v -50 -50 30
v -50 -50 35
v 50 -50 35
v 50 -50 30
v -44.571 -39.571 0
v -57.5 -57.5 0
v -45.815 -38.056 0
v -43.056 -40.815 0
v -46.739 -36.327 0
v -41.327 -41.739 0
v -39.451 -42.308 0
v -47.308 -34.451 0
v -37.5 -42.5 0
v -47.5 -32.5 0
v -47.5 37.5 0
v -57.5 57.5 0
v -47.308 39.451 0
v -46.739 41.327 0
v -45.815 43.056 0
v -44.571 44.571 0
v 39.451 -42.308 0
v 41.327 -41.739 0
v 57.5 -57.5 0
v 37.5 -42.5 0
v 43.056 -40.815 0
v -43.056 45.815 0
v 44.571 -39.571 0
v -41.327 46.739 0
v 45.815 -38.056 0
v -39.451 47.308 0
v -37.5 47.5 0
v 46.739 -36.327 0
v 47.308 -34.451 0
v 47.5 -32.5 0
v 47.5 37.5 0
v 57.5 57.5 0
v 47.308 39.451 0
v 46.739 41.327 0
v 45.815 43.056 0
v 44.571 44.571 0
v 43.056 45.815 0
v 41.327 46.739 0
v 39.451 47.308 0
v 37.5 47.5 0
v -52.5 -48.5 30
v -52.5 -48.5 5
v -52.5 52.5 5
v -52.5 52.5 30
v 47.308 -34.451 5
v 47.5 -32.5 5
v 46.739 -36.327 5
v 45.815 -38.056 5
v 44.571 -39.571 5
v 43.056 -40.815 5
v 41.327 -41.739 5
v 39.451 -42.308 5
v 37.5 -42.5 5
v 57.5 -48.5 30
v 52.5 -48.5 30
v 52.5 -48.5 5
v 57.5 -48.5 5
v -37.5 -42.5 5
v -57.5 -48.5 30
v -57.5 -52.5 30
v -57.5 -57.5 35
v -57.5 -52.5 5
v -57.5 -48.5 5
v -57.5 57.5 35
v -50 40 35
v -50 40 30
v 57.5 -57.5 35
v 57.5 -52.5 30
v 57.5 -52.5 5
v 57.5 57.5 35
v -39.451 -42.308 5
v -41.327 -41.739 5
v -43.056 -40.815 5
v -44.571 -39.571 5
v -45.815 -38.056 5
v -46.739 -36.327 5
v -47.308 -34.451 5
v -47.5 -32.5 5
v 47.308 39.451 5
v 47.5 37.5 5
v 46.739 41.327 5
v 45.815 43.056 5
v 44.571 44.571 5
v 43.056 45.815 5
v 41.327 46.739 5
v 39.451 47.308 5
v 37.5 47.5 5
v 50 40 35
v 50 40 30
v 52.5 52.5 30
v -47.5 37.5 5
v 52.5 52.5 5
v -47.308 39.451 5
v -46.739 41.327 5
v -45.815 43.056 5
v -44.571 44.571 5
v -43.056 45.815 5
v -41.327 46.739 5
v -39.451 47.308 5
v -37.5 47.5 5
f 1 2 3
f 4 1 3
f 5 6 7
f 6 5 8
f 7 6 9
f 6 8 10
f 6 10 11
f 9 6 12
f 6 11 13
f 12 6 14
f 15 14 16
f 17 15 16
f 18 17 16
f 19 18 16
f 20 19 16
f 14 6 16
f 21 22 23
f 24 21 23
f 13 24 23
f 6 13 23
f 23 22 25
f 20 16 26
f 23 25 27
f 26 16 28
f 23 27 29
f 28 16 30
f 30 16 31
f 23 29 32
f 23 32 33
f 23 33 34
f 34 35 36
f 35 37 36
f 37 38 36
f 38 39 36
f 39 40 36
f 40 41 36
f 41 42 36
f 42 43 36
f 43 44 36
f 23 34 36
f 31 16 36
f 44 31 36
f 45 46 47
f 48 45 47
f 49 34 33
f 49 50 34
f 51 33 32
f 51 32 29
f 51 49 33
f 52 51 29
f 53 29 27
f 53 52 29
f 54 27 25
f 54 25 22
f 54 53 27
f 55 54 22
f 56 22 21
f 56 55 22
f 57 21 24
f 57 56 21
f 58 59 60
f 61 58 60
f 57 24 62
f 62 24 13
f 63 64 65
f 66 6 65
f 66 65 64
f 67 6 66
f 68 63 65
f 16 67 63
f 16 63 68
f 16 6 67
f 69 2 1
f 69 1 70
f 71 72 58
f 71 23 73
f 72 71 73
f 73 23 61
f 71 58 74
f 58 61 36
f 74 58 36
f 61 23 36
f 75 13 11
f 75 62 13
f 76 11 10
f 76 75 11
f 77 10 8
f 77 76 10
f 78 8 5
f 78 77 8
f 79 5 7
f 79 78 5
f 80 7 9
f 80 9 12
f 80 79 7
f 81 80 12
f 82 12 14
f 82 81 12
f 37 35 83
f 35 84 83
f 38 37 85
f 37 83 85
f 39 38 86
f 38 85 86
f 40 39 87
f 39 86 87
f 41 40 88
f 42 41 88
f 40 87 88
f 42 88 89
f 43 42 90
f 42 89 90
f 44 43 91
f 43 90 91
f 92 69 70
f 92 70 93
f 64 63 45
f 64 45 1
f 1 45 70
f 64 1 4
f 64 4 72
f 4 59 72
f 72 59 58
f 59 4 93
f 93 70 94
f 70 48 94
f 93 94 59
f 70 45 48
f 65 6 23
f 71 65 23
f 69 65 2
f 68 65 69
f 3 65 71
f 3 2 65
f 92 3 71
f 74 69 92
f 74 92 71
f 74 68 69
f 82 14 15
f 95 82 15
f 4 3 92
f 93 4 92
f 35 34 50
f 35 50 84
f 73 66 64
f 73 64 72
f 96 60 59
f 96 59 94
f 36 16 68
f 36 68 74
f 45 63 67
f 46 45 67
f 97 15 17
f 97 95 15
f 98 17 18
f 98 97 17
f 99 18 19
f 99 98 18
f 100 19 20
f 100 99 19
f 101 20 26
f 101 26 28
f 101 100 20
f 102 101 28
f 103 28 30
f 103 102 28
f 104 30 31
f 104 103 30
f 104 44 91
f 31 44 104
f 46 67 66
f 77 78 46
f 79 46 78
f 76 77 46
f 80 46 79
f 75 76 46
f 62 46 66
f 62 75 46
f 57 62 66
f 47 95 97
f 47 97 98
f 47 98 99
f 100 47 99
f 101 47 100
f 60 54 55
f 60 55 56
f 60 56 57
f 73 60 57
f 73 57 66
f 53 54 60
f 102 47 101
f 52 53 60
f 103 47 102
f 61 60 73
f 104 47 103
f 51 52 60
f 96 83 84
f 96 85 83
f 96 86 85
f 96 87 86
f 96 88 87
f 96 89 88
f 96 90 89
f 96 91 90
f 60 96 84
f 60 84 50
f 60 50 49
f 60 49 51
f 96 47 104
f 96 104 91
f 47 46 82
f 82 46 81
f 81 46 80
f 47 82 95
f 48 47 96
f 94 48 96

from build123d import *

# Parameters (mm, degrees)
SKETCH1_W               = 115
SKETCH1_H               = 115
BOSS_EXTRUDE1_DEPTH     = 35
SHELL2_T                = 5
SKETCH4_W               = 100
SKETCH4_H               = 90
CUT_EXTRUDE1_DEPTH      = 30
SKETCH5_W               = 95
SKETCH5_H               = 90
CUT_EXTRUDE2_DEPTH      = 30
FILLET1_R               = 10
CUT_EXTRUDE3_DEPTH      = 129.962203765
CUT_EXTRUDE3_DEPTH_BACK = 129.962203765
SKETCH9_W               = 25
SKETCH9_H               = 4


with BuildPart() as part:
    # Sketch1 → Boss-Extrude1 (new body)
    with BuildSketch(Plane.XY):
        Rectangle(SKETCH1_W, SKETCH1_H)
    extrude(amount=BOSS_EXTRUDE1_DEPTH)

    # Shell2 (no face opened: a closed hollow body)
    add(offset(amount=-SHELL2_T, mode=Mode.PRIVATE), mode=Mode.SUBTRACT)

    # Sketch4 → Cut-Extrude1 (cut)
    with BuildSketch(Plane.XY.offset(35)):
        with Locations((0, -5)):
            Rectangle(SKETCH4_W, SKETCH4_H)
    extrude(amount=-CUT_EXTRUDE1_DEPTH, mode=Mode.SUBTRACT)

    # Sketch5 → Cut-Extrude2 (cut)
    with BuildSketch(Plane(origin=(0, 0, 0), x_dir=(-1, 0, 0), z_dir=(0, 0, -1))):
        with Locations((0, 2.5)):
            Rectangle(SKETCH5_W, SKETCH5_H)
    extrude(amount=-CUT_EXTRUDE2_DEPTH, mode=Mode.SUBTRACT)

    # Fillet1
    fillet1_edges = [part.edges().sort_by_distance(p)[0] for p in [
        (-47.5, -42.5, 2.5),
        (47.5, -42.5, 2.5),
        (47.5, 47.5, 2.5),
        (-47.5, 47.5, 2.5),
    ]]
    fillet(fillet1_edges, radius=FILLET1_R)

    # Sketch9 → Cut-Extrude3 (cut, two sides: drawn at the far end of the back side and taken through both)
    with BuildSketch(Plane(origin=(-52.5, 0, 0), x_dir=(0, 0, -1), z_dir=(1, 0, 0)).offset(-CUT_EXTRUDE3_DEPTH_BACK)):
        with Locations((-17.5, -50.5)):
            Rectangle(SKETCH9_W, SKETCH9_H)
    extrude(amount=CUT_EXTRUDE3_DEPTH + CUT_EXTRUDE3_DEPTH_BACK, mode=Mode.SUBTRACT)


solid = part.part
